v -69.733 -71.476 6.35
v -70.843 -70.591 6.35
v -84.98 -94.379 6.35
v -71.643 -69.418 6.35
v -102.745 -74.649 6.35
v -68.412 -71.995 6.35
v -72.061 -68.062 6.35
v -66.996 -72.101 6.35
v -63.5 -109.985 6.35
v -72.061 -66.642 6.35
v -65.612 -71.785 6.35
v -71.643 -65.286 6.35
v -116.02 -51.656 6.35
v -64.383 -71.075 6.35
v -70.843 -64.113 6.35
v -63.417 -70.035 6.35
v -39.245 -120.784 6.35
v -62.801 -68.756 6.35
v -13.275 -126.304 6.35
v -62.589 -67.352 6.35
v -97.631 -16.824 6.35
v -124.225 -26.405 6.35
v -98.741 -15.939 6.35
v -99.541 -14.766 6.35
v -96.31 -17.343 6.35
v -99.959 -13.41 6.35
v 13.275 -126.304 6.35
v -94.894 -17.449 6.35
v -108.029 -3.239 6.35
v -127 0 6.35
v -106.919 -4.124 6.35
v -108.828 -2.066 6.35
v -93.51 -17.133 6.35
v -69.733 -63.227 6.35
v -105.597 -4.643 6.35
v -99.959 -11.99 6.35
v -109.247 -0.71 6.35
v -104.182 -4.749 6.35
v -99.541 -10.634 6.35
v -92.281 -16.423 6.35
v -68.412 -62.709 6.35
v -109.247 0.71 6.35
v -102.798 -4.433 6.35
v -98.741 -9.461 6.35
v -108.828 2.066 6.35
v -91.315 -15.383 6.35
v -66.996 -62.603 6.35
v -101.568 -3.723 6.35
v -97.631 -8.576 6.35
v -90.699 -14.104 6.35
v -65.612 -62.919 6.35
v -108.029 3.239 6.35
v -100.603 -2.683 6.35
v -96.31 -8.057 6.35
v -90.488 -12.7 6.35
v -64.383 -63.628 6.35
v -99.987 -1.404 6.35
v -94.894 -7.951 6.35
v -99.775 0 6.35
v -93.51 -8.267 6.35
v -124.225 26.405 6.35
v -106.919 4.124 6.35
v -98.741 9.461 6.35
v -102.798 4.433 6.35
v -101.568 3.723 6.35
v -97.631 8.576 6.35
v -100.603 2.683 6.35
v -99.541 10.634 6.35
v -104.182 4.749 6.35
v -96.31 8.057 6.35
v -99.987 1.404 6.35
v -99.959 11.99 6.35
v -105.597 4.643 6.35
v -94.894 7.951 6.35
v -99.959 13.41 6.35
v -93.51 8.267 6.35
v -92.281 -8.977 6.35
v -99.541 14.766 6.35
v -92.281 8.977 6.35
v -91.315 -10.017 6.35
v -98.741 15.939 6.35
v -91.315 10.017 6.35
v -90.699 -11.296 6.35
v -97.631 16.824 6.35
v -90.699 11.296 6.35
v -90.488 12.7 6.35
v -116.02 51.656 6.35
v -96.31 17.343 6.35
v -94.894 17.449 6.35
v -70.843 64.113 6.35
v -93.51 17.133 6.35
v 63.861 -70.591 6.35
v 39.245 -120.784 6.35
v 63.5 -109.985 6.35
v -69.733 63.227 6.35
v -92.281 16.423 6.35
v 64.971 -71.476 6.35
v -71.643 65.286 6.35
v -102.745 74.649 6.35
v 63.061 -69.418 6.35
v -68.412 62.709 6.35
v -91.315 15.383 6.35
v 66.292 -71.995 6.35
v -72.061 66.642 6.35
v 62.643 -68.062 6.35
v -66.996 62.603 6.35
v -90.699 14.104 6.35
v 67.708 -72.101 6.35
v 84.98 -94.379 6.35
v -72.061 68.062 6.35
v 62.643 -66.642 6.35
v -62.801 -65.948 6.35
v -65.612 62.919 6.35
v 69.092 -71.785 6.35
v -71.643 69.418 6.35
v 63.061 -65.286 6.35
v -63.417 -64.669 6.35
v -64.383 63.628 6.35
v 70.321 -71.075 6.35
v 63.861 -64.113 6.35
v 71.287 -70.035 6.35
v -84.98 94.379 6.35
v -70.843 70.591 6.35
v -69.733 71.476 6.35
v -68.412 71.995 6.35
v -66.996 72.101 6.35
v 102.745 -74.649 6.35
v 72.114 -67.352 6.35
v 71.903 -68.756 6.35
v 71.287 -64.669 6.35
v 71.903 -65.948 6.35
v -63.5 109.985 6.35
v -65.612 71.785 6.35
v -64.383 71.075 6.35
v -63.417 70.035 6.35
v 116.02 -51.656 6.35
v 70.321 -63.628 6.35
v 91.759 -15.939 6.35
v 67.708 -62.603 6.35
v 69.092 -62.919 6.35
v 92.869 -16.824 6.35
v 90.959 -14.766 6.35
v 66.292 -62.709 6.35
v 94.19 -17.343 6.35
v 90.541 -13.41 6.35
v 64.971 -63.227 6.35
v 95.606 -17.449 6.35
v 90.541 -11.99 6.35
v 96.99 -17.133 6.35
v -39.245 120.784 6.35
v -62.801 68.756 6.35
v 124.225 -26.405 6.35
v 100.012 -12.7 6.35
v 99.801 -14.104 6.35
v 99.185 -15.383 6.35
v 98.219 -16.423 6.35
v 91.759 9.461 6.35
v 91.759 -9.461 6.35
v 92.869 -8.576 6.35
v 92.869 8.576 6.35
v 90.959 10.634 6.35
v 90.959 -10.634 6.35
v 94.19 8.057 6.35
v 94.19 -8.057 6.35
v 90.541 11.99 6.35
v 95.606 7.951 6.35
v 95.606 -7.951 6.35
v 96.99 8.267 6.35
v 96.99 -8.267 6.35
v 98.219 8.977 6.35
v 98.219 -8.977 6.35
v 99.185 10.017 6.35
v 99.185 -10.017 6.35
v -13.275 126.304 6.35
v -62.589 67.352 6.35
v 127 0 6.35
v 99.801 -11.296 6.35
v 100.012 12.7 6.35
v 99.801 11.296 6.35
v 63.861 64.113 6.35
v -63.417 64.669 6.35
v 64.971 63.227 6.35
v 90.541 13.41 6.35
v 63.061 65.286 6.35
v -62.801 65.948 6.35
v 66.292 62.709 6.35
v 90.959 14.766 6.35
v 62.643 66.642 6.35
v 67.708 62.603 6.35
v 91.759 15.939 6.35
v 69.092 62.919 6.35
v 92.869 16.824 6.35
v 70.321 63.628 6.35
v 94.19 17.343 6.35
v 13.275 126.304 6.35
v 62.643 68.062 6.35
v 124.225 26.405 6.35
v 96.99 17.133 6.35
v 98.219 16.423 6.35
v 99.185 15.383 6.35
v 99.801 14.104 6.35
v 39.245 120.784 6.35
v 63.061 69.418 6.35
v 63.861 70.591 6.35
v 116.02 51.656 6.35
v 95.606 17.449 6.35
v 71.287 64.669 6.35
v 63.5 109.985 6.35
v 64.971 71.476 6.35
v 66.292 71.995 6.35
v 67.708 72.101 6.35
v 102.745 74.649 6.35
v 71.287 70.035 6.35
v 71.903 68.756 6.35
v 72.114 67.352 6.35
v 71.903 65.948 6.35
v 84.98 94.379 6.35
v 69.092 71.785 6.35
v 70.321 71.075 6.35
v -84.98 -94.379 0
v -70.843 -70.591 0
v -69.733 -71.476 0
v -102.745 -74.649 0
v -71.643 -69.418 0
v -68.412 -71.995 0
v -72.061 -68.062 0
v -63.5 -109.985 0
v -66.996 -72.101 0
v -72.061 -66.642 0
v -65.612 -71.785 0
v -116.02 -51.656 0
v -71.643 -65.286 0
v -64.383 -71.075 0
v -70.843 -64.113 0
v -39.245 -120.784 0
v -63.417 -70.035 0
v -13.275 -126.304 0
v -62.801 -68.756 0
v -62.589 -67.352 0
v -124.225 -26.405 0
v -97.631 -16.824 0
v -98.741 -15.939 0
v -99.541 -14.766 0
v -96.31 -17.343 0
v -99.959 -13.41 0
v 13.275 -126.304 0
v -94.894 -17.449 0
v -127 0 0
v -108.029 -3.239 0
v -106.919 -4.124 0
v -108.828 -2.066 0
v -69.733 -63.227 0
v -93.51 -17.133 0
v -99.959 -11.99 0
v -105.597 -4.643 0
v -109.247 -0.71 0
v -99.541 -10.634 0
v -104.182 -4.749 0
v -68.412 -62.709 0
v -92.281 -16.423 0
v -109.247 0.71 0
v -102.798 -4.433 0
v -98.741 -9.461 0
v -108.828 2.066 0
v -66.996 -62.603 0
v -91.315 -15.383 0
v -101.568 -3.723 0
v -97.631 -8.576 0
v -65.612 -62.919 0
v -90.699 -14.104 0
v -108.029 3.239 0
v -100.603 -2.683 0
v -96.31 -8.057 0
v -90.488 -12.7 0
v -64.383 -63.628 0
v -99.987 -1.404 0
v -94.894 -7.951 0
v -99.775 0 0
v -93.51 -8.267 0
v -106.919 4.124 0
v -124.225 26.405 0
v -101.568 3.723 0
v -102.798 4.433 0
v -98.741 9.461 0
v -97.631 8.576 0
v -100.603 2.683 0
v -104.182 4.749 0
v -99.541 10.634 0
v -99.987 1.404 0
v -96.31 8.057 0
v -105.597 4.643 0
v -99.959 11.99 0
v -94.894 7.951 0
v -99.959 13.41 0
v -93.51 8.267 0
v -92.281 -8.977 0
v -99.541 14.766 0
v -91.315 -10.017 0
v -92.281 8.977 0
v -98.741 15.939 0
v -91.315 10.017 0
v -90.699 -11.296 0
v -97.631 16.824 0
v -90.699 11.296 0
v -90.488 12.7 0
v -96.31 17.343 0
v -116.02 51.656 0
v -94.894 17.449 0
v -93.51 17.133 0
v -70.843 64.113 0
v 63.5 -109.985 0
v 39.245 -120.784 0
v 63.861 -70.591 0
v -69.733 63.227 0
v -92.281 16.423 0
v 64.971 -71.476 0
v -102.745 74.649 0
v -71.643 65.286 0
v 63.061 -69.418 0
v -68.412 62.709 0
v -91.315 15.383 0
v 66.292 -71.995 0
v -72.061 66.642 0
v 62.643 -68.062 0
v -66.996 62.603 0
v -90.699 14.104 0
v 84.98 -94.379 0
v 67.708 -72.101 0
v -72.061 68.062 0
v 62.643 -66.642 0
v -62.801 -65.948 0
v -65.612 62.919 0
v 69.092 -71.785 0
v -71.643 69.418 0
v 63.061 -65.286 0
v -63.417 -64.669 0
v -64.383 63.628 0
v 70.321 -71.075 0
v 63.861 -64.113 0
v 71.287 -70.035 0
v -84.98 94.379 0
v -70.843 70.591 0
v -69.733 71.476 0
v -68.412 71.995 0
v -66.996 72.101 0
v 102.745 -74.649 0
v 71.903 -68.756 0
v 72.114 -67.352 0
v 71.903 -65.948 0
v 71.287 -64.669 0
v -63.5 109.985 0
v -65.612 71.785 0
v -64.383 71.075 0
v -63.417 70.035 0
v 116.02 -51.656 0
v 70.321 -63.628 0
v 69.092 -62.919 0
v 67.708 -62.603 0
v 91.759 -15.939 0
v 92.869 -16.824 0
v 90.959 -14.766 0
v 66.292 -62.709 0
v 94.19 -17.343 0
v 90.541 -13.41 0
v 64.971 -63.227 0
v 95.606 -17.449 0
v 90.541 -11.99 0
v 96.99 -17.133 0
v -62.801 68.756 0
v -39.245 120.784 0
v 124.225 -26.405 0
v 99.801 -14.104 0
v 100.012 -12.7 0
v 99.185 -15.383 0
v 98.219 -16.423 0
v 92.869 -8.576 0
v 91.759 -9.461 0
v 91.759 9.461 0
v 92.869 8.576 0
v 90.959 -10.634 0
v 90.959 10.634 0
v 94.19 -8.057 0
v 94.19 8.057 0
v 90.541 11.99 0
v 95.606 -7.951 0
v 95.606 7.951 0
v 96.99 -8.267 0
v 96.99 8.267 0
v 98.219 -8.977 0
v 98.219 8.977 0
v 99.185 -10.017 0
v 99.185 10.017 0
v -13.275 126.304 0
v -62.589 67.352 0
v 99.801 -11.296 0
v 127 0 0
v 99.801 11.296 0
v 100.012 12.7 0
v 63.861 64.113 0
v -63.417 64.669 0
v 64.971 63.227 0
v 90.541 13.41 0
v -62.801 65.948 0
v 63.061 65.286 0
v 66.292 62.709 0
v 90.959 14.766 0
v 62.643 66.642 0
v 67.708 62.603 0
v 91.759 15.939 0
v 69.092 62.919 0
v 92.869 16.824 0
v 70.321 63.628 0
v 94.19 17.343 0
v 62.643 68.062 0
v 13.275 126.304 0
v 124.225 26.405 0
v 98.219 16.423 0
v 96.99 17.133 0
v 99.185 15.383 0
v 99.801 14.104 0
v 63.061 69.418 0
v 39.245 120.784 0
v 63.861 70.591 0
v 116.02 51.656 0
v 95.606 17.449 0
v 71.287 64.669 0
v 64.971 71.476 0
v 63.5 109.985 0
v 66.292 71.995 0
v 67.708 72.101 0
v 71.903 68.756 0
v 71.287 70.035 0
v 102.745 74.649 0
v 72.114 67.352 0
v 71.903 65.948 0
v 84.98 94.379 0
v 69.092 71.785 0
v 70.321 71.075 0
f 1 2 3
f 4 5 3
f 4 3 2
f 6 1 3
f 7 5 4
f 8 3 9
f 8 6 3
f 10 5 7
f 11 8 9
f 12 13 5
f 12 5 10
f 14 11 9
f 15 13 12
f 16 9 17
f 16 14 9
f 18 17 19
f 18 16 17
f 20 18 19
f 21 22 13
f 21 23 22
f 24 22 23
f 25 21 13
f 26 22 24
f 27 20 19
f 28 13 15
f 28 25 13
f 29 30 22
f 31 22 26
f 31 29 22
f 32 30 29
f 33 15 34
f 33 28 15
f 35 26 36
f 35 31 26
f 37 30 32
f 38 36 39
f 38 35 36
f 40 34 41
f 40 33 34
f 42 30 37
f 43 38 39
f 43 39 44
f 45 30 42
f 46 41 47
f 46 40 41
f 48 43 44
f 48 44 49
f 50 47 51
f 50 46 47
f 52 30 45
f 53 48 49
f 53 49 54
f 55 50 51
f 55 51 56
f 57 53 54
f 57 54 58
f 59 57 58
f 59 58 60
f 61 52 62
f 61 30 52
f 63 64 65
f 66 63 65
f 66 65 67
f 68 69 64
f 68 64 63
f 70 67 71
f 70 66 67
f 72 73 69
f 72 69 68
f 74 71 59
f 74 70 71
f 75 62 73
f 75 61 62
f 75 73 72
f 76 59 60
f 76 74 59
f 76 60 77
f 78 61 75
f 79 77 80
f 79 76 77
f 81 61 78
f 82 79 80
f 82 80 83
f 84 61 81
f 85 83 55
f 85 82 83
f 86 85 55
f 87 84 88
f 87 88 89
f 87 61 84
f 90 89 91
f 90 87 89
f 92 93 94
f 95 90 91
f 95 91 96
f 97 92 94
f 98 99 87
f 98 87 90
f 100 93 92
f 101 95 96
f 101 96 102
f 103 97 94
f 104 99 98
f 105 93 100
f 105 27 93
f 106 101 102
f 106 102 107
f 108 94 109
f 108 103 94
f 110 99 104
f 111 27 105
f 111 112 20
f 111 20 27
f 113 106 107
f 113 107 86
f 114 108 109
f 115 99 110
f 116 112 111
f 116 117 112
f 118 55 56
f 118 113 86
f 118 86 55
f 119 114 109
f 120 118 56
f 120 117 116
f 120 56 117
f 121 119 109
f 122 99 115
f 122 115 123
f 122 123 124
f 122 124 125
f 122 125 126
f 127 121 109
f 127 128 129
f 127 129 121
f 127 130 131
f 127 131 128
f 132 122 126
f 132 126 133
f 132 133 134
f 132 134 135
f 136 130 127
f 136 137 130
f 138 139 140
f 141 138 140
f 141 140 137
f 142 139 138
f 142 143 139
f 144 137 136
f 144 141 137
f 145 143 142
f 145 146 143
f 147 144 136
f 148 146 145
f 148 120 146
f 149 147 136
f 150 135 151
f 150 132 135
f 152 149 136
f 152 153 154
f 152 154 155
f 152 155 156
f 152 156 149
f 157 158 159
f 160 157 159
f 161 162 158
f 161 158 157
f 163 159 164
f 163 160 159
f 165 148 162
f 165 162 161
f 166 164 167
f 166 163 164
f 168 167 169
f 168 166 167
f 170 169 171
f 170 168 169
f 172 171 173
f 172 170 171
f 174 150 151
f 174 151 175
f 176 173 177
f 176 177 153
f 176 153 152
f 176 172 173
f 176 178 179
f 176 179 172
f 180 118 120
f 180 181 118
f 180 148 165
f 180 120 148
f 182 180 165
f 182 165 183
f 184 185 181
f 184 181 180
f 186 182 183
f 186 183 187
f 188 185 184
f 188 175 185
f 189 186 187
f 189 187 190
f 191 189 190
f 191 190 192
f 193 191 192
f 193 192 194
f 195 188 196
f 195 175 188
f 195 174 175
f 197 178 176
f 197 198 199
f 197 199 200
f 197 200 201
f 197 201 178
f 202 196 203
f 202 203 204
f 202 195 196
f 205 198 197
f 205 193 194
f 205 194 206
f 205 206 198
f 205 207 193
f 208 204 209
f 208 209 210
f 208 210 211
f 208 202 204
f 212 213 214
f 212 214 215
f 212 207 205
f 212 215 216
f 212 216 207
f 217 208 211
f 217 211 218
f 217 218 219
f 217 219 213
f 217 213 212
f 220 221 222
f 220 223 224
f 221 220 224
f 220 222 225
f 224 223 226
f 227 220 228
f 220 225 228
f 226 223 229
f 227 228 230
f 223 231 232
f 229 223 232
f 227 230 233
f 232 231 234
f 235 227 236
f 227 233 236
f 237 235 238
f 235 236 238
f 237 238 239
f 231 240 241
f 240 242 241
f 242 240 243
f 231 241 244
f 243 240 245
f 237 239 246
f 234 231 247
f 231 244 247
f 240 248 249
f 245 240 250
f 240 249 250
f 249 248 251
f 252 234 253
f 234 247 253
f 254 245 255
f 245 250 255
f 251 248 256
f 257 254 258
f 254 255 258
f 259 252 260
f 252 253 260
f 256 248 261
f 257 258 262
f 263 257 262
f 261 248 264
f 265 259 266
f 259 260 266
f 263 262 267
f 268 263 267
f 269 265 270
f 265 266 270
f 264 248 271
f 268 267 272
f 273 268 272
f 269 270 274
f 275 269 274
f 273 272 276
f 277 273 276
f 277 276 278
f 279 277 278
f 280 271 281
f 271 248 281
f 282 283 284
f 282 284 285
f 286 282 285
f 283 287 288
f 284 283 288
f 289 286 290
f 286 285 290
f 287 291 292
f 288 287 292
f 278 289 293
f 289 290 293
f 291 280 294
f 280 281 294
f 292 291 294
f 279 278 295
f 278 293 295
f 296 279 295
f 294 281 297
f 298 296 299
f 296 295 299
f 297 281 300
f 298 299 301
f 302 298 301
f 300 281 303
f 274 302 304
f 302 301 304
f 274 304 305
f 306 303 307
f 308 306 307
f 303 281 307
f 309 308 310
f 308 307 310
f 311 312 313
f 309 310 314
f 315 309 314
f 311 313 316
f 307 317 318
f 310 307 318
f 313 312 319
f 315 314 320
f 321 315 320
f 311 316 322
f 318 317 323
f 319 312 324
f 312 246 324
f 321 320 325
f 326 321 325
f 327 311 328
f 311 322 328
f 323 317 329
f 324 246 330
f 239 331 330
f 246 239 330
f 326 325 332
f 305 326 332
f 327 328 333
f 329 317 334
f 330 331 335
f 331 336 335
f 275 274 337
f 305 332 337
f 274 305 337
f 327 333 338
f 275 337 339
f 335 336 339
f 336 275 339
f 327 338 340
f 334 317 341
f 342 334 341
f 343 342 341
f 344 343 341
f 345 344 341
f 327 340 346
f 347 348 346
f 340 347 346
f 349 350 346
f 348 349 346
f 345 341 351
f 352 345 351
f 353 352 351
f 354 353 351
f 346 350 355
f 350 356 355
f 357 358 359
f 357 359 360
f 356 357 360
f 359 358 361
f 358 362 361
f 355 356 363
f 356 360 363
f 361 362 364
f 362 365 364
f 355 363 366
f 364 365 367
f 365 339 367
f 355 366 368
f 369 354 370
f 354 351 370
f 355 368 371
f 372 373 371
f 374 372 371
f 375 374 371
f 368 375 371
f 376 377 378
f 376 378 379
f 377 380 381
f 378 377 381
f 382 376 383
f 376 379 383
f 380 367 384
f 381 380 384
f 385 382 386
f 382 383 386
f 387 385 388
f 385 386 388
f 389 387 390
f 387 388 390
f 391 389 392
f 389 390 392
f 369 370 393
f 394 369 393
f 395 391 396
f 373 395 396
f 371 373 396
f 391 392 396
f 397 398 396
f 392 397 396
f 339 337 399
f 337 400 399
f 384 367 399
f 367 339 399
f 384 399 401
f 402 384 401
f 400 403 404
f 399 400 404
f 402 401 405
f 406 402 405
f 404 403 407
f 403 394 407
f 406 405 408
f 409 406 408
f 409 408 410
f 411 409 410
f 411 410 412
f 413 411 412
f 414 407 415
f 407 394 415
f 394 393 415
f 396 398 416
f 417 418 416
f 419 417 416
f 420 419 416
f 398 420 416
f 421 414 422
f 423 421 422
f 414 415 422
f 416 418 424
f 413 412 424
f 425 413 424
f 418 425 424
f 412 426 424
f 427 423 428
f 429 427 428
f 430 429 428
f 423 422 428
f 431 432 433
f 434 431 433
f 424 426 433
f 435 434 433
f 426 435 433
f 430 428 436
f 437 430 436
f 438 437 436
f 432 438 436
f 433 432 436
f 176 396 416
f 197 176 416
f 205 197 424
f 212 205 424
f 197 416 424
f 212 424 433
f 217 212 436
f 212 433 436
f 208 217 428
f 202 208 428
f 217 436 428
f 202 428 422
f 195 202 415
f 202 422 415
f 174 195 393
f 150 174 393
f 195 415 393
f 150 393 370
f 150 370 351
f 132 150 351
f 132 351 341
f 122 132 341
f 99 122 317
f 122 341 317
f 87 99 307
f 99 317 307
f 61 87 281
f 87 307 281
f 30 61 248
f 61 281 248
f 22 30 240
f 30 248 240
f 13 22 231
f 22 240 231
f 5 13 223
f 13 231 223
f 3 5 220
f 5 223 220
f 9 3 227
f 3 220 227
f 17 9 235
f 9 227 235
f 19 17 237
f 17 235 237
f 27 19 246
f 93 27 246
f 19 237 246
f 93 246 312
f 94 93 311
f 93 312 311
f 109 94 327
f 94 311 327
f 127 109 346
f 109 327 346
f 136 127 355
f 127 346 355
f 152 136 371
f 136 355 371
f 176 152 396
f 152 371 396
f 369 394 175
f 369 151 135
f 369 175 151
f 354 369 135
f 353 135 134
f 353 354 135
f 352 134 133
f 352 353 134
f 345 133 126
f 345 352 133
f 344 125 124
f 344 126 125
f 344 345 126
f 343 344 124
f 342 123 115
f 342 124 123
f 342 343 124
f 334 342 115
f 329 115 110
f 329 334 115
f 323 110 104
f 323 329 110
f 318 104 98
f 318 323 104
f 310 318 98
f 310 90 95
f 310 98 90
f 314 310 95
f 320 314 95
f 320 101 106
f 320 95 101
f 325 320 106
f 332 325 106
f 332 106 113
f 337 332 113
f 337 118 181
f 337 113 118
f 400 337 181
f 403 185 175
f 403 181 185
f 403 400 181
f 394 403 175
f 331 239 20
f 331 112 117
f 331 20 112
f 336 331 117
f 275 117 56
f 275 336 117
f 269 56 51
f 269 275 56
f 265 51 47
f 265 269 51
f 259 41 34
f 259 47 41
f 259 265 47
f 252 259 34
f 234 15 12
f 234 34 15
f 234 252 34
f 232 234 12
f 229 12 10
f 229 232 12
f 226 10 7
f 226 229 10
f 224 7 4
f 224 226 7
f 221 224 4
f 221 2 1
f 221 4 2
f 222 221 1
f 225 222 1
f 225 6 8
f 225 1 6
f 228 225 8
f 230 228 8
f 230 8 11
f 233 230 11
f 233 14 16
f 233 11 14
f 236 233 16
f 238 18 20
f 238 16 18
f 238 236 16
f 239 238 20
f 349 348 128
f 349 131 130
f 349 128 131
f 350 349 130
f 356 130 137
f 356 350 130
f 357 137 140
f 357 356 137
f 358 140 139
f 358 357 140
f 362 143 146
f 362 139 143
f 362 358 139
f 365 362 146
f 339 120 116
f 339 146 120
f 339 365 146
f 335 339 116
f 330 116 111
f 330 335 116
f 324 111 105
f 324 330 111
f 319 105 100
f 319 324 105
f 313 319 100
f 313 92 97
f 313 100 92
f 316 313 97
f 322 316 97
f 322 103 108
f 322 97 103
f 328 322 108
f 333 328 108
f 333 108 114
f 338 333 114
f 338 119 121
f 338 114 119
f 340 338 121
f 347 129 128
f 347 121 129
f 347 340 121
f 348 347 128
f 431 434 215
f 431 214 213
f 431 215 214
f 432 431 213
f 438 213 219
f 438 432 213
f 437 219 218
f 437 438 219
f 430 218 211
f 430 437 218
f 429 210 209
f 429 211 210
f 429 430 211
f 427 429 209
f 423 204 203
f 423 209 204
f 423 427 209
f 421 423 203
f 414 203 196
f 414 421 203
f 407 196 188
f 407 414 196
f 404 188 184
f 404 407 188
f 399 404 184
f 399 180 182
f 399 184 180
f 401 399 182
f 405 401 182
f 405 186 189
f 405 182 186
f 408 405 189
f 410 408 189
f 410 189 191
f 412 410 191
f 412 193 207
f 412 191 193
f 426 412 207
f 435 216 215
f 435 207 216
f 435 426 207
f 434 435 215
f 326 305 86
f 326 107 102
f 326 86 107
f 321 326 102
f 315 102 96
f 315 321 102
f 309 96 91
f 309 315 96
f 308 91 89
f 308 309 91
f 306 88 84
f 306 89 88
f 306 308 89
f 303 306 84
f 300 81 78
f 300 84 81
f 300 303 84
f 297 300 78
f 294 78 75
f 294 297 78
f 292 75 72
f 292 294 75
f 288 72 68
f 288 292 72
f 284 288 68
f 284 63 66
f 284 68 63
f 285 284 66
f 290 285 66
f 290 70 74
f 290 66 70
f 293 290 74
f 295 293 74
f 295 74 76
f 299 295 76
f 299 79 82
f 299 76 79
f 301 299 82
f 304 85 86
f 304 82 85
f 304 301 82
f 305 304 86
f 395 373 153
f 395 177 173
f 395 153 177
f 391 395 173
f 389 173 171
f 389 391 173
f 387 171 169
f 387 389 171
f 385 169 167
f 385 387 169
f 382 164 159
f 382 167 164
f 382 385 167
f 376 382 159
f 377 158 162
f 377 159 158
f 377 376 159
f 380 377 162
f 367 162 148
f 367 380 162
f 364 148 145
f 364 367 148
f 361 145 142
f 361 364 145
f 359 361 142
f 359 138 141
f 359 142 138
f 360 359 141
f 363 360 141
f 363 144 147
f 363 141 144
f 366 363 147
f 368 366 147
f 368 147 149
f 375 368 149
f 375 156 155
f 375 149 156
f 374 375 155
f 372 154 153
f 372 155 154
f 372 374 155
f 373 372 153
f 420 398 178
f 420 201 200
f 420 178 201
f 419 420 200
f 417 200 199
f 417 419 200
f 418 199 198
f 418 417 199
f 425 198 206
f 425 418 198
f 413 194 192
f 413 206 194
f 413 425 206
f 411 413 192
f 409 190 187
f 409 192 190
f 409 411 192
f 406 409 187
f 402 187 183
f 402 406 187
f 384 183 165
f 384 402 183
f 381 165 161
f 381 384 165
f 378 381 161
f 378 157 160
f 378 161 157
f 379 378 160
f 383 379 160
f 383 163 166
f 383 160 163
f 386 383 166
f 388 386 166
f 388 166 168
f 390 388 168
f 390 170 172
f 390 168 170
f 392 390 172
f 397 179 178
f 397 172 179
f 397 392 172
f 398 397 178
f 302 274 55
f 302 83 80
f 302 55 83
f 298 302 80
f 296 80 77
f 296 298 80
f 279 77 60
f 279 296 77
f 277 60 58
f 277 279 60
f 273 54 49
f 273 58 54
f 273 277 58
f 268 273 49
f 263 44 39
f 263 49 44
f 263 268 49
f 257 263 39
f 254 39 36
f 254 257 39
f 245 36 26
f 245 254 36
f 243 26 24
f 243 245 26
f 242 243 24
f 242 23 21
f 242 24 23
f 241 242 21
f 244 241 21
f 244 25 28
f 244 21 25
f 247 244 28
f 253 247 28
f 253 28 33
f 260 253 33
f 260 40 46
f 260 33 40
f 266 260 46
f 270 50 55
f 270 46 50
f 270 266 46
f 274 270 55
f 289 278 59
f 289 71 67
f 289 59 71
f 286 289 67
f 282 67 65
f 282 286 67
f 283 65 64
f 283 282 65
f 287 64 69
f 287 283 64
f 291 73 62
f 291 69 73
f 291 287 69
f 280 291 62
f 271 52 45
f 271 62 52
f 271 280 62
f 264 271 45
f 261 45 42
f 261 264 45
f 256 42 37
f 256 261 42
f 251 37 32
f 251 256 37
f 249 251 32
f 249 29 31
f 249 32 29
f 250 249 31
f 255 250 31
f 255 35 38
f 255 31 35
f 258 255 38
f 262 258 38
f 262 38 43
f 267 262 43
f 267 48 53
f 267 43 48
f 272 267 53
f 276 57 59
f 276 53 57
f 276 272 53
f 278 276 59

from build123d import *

# Parameters (mm, degrees)
SKETCH1_R               = 127
BOSS_EXTRUDE1_DEPTH     = 6.35
CUT_EXTRUDE1_DEPTH      = 180.717340566
CUT_EXTRUDE1_DEPTH_BACK = 180.717340566
SKETCH2_R               = 4.7625
CUT_EXTRUDE2_DEPTH      = 180.717340566
CUT_EXTRUDE2_DEPTH_BACK = 180.717340566
SKETCH3_R               = 4.7625
CUT_EXTRUDE4_DEPTH      = 180.717340566
CUT_EXTRUDE4_DEPTH_BACK = 180.717340566
SKETCH4_R               = 4.7625


with BuildPart() as part:
    # Sketch1 → Boss-Extrude1 (new body)
    with BuildSketch(Plane.XY):
        Circle(SKETCH1_R)
    extrude(amount=BOSS_EXTRUDE1_DEPTH)

    # Sketch2 → Cut-Extrude1 (cut, two sides: drawn at the far end of the back side and taken through both)
    with BuildSketch(Plane.XY.offset(6.35).offset(-CUT_EXTRUDE1_DEPTH_BACK)):
        with Locations((-67.351920908, 67.351920908)):
            Circle(SKETCH2_R)
        with Locations((-67.351920908, -67.351920908)):
            Circle(SKETCH2_R)
        with Locations((67.351920908, -67.351920908)):
            Circle(SKETCH2_R)
        with Locations((67.351920908, 67.351920908)):
            Circle(SKETCH2_R)
    extrude(amount=CUT_EXTRUDE1_DEPTH + CUT_EXTRUDE1_DEPTH_BACK, mode=Mode.SUBTRACT)

    # Sketch3 → Cut-Extrude2 (cut, two sides: drawn at the far end of the back side and taken through both)
    with BuildSketch(Plane.XY.offset(6.35).offset(-CUT_EXTRUDE2_DEPTH_BACK)):
        with Locations((-95.25, 12.7)):
            Circle(SKETCH3_R)
        with Locations((-95.25, -12.7)):
            Circle(SKETCH3_R)
        with Locations((95.25, -12.7)):
            Circle(SKETCH3_R)
        with Locations((95.25, 12.7)):
            Circle(SKETCH3_R)
    extrude(amount=CUT_EXTRUDE2_DEPTH + CUT_EXTRUDE2_DEPTH_BACK, mode=Mode.SUBTRACT)

    # Sketch4 → Cut-Extrude4 (cut, two sides: drawn at the far end of the back side and taken through both)
    with BuildSketch(Plane.XY.offset(6.35).offset(-CUT_EXTRUDE4_DEPTH_BACK)):
        with Locations((-104.537500094, 0)):
            Circle(SKETCH4_R)
    extrude(amount=CUT_EXTRUDE4_DEPTH + CUT_EXTRUDE4_DEPTH_BACK, mode=Mode.SUBTRACT)


solid = part.part
